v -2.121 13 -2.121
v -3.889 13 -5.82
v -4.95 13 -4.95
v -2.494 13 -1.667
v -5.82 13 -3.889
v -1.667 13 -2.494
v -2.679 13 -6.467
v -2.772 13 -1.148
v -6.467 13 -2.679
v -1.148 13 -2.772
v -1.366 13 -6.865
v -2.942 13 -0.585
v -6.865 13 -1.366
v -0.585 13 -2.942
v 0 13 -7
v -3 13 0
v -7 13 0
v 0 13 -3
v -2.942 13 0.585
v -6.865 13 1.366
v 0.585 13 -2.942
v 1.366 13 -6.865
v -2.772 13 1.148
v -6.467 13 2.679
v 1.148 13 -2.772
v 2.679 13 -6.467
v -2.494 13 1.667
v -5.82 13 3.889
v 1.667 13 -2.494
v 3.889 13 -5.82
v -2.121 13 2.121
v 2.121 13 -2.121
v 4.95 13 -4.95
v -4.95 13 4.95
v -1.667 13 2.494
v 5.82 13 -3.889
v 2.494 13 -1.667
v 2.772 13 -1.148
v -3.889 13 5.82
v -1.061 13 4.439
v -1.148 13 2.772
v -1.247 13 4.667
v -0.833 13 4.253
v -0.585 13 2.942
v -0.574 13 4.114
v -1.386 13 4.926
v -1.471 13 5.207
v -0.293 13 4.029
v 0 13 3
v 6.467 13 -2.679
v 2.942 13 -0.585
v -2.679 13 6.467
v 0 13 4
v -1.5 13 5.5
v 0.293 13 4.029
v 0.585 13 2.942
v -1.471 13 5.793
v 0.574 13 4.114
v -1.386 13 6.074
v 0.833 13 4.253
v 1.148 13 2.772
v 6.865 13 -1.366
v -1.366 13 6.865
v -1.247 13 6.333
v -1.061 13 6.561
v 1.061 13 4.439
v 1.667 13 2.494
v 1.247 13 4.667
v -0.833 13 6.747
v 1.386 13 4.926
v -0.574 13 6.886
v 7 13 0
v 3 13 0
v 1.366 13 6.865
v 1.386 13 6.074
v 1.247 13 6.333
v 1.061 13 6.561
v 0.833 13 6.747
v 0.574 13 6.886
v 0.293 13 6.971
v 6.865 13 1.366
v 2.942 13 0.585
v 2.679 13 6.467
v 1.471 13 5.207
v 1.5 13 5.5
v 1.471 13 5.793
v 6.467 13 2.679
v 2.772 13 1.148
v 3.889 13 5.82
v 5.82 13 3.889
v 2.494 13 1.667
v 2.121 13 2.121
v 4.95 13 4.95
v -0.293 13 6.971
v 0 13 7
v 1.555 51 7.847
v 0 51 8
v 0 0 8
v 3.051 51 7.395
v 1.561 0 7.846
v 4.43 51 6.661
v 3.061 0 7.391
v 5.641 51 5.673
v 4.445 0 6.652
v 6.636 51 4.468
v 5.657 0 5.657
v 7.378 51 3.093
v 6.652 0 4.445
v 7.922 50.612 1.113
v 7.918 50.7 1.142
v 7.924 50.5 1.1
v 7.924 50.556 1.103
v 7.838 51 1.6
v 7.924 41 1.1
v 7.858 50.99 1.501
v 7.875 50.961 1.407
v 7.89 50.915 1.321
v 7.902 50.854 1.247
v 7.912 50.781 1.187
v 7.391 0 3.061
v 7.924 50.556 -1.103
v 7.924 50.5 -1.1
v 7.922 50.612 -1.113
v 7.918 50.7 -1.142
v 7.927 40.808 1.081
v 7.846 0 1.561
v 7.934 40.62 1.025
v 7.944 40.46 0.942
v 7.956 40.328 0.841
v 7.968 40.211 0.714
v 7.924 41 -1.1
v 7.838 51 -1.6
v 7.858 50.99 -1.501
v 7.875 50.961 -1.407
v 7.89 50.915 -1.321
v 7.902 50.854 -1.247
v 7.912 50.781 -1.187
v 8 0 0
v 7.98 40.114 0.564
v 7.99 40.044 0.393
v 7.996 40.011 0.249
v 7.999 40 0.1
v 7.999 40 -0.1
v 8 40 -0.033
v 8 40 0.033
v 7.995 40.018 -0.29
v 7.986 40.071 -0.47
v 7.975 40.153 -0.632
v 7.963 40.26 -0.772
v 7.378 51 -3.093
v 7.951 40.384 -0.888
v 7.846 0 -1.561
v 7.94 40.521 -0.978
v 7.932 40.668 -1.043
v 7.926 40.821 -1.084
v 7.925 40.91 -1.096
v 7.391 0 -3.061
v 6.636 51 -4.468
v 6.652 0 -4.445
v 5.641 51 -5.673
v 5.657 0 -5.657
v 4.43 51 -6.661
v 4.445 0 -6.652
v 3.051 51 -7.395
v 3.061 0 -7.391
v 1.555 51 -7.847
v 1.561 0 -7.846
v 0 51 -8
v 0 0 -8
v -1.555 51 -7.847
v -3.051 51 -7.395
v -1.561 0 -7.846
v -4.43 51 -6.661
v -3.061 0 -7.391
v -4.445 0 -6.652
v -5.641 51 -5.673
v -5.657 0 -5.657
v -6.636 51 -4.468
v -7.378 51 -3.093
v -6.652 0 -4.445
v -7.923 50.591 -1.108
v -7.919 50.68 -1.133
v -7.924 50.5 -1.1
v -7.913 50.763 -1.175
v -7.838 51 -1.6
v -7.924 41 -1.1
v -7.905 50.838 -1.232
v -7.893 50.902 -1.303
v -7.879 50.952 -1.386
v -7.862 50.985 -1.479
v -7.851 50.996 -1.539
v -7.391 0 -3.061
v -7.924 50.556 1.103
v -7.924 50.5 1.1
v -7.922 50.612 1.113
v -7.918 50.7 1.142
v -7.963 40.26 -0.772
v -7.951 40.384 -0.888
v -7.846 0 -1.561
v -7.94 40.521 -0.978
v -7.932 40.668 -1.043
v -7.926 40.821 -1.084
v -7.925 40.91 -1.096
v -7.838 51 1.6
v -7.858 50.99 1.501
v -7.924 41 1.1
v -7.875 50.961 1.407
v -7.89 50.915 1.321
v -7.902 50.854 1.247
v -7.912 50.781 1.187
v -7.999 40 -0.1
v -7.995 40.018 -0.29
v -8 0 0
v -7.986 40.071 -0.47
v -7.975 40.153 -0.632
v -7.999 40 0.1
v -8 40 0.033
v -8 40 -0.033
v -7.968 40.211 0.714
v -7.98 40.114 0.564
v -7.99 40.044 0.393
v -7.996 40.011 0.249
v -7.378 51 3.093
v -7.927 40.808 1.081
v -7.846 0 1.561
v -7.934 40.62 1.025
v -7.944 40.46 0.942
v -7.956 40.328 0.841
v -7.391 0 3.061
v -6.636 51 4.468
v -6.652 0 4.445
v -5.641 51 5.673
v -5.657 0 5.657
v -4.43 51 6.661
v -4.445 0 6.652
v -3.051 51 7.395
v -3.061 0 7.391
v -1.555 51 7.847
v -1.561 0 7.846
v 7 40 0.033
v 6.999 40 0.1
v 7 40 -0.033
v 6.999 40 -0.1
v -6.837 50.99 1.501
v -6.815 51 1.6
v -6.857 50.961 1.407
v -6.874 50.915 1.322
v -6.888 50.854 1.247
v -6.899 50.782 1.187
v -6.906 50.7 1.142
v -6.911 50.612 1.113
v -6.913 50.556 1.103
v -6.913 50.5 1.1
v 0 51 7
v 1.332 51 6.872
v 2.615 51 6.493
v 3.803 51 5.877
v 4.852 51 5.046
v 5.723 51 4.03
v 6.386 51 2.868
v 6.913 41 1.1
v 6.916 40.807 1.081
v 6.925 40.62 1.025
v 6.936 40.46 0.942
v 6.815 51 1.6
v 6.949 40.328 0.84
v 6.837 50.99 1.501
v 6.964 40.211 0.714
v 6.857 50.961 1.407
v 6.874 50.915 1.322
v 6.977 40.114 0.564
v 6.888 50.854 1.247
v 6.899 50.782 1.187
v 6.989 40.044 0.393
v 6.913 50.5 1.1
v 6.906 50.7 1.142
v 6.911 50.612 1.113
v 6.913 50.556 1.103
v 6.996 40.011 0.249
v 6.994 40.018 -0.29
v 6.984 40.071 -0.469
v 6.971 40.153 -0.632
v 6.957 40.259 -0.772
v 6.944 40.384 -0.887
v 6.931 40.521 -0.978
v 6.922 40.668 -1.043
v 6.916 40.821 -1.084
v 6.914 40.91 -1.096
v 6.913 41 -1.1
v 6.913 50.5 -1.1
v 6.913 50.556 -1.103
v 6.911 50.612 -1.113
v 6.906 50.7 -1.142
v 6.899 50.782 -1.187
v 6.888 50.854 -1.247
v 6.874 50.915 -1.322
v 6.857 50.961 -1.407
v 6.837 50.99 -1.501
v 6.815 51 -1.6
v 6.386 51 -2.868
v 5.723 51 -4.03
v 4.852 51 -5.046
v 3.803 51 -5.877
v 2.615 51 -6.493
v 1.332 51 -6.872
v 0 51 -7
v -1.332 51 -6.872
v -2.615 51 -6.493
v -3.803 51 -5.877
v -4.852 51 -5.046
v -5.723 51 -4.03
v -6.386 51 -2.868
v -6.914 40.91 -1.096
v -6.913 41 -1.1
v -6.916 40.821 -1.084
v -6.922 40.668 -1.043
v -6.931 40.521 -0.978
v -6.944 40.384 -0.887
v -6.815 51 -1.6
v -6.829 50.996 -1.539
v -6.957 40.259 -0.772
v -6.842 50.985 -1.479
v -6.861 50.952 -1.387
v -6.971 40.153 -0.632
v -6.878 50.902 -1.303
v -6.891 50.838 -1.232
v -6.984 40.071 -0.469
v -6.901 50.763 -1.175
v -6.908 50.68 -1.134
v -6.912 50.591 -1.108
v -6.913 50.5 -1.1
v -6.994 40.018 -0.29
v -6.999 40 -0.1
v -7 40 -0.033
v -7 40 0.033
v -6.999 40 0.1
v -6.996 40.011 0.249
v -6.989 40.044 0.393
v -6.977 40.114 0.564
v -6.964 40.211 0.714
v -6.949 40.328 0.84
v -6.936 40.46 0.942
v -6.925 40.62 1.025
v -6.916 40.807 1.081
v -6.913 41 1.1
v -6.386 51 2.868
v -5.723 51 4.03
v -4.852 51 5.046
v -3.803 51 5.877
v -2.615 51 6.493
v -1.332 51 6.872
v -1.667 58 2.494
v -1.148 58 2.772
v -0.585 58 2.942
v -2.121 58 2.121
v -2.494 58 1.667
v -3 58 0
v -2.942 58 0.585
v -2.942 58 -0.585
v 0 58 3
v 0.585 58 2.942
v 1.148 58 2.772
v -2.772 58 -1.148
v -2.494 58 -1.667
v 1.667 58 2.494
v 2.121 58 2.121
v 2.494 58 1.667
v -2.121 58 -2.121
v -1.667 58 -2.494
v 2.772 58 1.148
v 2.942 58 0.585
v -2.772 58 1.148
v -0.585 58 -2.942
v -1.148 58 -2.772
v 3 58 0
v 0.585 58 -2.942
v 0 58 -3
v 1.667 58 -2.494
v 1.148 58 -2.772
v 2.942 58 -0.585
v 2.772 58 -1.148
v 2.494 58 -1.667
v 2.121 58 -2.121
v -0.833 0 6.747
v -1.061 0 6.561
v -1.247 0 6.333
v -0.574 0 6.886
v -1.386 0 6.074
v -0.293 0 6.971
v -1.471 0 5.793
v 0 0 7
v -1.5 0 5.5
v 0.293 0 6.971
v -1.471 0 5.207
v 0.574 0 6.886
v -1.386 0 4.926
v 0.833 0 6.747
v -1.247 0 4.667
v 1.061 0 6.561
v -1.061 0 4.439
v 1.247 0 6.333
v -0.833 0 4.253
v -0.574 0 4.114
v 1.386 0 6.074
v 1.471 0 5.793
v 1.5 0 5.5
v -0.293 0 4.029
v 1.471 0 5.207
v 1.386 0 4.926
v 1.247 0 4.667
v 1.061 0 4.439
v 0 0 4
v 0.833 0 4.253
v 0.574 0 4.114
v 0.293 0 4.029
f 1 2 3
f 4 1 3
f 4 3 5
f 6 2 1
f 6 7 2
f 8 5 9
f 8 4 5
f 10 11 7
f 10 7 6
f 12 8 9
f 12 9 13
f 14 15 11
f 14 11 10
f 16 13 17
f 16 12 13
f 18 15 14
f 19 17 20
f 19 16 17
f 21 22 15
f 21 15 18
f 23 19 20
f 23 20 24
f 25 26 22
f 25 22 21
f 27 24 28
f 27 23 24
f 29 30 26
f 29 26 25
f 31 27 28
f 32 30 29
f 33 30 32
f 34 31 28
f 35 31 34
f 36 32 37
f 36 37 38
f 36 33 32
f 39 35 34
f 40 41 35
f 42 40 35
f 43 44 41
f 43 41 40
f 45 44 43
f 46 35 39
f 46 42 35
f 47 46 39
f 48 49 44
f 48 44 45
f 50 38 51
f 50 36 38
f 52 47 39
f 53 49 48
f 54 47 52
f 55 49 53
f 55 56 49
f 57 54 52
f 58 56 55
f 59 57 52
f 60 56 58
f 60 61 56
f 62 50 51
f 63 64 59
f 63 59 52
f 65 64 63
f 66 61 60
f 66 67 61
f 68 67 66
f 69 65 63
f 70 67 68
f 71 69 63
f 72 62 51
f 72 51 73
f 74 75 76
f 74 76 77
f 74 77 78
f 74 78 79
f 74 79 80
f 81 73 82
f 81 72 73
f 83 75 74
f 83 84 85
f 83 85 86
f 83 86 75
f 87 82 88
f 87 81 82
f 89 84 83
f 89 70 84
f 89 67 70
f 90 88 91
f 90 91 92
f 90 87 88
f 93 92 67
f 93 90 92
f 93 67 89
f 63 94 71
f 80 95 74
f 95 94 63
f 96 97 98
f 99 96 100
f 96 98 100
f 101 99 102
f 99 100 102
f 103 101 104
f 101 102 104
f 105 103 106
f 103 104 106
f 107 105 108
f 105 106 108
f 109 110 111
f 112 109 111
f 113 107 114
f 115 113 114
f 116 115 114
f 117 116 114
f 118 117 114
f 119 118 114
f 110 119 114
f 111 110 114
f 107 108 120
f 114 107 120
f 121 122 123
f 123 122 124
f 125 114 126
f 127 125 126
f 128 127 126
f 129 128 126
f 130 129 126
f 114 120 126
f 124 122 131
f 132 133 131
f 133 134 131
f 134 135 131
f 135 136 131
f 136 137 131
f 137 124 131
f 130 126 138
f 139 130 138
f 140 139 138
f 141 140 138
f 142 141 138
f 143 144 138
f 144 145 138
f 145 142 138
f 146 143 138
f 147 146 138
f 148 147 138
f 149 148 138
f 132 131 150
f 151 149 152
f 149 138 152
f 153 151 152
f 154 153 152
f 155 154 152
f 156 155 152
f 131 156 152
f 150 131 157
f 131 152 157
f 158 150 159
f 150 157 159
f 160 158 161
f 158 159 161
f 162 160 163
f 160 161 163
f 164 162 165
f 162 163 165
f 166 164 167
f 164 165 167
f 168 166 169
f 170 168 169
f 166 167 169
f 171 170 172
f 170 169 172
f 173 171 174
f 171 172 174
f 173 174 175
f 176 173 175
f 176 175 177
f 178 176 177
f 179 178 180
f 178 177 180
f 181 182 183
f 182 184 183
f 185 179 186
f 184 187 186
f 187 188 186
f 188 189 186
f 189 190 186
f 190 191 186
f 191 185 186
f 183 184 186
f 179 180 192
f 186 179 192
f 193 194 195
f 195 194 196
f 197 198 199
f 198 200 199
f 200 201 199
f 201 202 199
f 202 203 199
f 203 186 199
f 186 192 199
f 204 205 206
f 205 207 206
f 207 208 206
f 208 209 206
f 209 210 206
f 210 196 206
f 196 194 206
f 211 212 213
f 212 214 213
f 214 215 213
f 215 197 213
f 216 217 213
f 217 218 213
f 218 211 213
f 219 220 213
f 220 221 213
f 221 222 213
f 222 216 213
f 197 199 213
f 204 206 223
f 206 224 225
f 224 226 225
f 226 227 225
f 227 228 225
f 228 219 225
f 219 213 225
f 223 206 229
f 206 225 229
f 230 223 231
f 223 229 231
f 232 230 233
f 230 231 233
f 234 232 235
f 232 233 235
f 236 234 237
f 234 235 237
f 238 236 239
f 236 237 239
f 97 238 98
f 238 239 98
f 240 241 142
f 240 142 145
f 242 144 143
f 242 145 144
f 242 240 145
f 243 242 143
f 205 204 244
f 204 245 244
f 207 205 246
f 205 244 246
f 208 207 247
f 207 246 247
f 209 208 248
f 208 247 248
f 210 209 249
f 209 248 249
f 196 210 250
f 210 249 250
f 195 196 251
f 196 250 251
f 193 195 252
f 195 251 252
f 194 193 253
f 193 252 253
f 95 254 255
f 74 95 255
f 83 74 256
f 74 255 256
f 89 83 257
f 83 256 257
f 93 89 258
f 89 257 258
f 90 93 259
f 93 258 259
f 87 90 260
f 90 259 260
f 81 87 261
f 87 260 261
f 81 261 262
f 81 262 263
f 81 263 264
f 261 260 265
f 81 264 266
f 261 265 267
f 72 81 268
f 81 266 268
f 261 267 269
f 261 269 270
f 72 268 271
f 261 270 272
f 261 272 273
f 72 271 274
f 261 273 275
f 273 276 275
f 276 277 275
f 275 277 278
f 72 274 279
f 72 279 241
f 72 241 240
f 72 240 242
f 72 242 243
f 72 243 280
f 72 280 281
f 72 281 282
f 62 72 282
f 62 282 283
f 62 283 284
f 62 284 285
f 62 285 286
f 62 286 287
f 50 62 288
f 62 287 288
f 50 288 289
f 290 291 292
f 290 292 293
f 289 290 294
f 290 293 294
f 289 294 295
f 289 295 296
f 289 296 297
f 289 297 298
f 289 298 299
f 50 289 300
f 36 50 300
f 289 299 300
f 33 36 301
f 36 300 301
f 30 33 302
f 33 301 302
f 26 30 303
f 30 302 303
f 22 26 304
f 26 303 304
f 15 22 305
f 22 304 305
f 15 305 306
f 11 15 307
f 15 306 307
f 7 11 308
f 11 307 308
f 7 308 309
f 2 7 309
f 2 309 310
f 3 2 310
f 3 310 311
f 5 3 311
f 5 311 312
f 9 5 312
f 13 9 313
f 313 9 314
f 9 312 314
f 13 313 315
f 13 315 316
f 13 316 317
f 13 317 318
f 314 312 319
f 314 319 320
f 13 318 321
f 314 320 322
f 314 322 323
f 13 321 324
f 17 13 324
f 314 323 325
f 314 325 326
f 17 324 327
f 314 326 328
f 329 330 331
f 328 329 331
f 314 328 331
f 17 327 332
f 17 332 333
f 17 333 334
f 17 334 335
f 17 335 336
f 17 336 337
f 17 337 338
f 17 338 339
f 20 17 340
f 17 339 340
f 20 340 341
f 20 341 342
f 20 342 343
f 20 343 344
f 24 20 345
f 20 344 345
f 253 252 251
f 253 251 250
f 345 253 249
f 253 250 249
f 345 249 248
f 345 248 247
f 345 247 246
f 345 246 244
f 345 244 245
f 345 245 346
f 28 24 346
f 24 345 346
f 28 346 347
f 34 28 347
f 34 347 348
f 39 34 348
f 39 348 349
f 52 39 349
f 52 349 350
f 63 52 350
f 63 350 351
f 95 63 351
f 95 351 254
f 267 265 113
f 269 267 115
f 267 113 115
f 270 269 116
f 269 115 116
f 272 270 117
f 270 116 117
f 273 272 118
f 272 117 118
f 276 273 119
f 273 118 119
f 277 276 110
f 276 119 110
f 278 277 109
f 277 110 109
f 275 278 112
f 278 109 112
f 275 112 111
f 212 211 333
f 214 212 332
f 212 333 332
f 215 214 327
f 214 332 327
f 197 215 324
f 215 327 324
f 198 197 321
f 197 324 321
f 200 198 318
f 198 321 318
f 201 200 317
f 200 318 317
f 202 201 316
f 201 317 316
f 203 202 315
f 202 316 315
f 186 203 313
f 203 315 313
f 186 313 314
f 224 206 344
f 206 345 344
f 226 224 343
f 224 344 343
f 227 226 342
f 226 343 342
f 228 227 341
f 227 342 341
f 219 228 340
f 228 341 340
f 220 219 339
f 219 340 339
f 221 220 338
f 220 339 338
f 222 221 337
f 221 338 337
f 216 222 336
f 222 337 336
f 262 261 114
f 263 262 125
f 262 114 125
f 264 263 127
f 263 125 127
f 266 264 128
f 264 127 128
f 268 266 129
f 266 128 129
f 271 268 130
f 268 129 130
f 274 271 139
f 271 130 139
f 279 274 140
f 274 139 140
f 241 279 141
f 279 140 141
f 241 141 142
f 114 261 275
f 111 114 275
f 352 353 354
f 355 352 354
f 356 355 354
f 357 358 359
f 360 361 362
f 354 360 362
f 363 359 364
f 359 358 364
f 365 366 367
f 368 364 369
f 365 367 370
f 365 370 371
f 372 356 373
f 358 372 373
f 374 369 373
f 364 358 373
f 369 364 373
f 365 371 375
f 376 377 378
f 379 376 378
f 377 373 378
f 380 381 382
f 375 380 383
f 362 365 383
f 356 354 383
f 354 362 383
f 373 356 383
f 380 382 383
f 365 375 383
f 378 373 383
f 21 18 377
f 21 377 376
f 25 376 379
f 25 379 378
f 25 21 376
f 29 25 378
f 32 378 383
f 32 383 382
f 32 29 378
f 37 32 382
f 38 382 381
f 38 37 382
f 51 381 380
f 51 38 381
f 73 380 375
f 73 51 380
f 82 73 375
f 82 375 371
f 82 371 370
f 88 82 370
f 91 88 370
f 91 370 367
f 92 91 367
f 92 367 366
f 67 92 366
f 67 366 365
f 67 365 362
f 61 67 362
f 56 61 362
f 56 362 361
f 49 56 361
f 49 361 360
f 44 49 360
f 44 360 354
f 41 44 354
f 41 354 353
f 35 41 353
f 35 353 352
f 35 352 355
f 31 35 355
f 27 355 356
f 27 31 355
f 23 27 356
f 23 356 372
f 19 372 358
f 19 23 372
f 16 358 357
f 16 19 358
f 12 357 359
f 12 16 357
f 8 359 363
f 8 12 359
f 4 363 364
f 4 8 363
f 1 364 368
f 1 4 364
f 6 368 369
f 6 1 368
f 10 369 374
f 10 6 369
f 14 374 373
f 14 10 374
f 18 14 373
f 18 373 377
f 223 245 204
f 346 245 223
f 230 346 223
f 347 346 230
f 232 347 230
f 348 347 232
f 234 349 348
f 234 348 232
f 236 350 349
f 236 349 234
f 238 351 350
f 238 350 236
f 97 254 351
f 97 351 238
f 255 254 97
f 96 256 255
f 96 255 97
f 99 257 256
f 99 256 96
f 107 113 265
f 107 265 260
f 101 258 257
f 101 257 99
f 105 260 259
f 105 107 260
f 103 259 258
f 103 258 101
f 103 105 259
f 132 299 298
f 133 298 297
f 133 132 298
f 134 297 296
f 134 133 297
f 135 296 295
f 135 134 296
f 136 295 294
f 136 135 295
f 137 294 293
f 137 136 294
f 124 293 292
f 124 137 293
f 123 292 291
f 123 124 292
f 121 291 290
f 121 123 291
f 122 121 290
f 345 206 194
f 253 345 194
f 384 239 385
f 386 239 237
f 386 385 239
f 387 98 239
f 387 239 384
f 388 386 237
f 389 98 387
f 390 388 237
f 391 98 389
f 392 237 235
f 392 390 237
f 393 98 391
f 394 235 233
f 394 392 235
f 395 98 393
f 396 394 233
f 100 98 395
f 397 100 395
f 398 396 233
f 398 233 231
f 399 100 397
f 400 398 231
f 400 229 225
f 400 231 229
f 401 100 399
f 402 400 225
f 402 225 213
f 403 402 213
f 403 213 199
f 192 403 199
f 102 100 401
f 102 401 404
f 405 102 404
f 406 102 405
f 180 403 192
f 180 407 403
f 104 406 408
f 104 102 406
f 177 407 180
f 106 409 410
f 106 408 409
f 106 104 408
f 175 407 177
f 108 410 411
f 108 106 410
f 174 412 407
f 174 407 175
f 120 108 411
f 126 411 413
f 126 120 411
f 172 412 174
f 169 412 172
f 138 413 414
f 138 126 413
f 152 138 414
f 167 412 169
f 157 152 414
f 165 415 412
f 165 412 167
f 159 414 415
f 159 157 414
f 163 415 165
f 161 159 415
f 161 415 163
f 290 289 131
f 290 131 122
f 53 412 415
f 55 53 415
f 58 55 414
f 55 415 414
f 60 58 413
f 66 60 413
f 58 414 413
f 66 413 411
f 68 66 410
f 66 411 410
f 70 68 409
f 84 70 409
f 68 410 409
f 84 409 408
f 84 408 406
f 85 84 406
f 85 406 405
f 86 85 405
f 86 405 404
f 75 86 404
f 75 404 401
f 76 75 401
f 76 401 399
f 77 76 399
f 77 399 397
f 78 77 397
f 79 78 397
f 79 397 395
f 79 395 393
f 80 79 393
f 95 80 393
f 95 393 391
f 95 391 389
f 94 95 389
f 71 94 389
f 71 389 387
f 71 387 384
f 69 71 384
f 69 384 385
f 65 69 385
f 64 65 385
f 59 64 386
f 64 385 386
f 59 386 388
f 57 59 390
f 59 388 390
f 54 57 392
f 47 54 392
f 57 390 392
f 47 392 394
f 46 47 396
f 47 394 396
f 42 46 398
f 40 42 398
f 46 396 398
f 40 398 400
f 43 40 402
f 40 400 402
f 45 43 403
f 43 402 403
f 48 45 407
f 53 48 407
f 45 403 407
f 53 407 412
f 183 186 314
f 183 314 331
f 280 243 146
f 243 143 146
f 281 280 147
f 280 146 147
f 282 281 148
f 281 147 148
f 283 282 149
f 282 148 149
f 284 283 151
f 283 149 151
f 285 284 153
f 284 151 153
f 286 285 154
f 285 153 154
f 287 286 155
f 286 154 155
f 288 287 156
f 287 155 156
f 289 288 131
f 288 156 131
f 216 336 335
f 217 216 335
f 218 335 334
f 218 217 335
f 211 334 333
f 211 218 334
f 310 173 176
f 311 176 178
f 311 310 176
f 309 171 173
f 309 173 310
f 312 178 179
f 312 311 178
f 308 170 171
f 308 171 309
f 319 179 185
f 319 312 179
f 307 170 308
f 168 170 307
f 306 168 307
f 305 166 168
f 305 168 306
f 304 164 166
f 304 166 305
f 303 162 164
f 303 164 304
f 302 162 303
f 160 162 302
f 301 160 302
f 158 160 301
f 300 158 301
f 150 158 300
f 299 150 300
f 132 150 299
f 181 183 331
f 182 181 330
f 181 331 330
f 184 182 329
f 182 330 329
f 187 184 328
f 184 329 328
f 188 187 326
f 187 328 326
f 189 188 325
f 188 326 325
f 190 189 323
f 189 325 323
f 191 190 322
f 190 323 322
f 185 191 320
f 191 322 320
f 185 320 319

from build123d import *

# Parameters (mm, degrees)
SKETCH_1_R               = 8
EXTRUDE_1_DEPTH          = 51
SKETCH_2_R               = 7
CUT_EXTRUDE_1_DEPTH      = 38
CUT_EXTRUDE_2_DEPTH      = 53.239831546
CUT_EXTRUDE_2_DEPTH_BACK = 53.239831546
SKETCH_3_W               = 2.2
SKETCH_3_H               = 22
FILLET_1_R               = 0.5
FILLET_2_R               = 1
SKETCH_5_R               = 1.5
CUT_EXTRUDE_8_DEPTH      = 38
SKETCH_4_R               = 3
EXTRUDE_2_DEPTH          = 58


with BuildPart() as part:
    # 草图1 → 凸台-拉伸1 (new body)
    with BuildSketch(Plane(origin=(0, 0, 0), x_dir=(1, 0, 0), z_dir=(0, 1, 0))):
        with Locations(Location((0, 0, 0), (0, 0, 270))):
            Circle(SKETCH_1_R)
    extrude(amount=EXTRUDE_1_DEPTH)

    # 草图2 → 切除-拉伸1 (cut)
    with BuildSketch(Plane(origin=(0, 51, 0), x_dir=(1, 0, 0), z_dir=(0, 1, 0))):
        with Locations(Location((0, 0, 0), (0, 0, 270))):
            Circle(SKETCH_2_R)
    extrude(amount=-CUT_EXTRUDE_1_DEPTH, mode=Mode.SUBTRACT)

    # 草图3 → 切除-拉伸2 (cut, two sides: drawn at the far end of the back side and taken through both)
    with BuildSketch(Plane(origin=(0, 0, 0), x_dir=(0, 0, -1), z_dir=(1, 0, 0)).offset(-CUT_EXTRUDE_2_DEPTH_BACK)):
        with Locations((0, 51)):
            Rectangle(SKETCH_3_W, SKETCH_3_H)
    extrude(amount=CUT_EXTRUDE_2_DEPTH + CUT_EXTRUDE_2_DEPTH_BACK, mode=Mode.SUBTRACT)

    # 圆角1
    fillet_1_edges = [part.edges().sort_by_distance(p)[0] for p in [
        (7.418522654, 51, -1.1),
        (-7.418522654, 51, -1.1),
        (-7.418522654, 51, 1.1),
        (7.418522654, 51, 1.1),
    ]]
    fillet(fillet_1_edges, radius=FILLET_1_R)

    # 圆角2
    fillet_2_edges = [part.edges().sort_by_distance(p)[0] for p in [
        (7.418522654, 40, -1.1),
        (-7.418522654, 40, -1.1),
        (7.418522654, 40, 1.1),
        (-7.418522654, 40, 1.1),
    ]]
    fillet(fillet_2_edges, radius=FILLET_2_R)

    # 草图5 → 切除-拉伸8 (cut)
    with BuildSketch(Plane.XZ):
        with Locations(Location((0, 5.5, 0), (0, 0, 270))):
            Circle(SKETCH_5_R)
    extrude(amount=-CUT_EXTRUDE_8_DEPTH, mode=Mode.SUBTRACT)

    # 草图4 → 凸台-拉伸2 (add)
    with BuildSketch(Plane(origin=(0, 0, 0), x_dir=(-1, 0, 0), z_dir=(0, -1, 0))):
        with Locations(Location((0, 0, 0), (0, 0, 90))):
            Circle(SKETCH_4_R)
    extrude(amount=-EXTRUDE_2_DEPTH)


solid = part.part
